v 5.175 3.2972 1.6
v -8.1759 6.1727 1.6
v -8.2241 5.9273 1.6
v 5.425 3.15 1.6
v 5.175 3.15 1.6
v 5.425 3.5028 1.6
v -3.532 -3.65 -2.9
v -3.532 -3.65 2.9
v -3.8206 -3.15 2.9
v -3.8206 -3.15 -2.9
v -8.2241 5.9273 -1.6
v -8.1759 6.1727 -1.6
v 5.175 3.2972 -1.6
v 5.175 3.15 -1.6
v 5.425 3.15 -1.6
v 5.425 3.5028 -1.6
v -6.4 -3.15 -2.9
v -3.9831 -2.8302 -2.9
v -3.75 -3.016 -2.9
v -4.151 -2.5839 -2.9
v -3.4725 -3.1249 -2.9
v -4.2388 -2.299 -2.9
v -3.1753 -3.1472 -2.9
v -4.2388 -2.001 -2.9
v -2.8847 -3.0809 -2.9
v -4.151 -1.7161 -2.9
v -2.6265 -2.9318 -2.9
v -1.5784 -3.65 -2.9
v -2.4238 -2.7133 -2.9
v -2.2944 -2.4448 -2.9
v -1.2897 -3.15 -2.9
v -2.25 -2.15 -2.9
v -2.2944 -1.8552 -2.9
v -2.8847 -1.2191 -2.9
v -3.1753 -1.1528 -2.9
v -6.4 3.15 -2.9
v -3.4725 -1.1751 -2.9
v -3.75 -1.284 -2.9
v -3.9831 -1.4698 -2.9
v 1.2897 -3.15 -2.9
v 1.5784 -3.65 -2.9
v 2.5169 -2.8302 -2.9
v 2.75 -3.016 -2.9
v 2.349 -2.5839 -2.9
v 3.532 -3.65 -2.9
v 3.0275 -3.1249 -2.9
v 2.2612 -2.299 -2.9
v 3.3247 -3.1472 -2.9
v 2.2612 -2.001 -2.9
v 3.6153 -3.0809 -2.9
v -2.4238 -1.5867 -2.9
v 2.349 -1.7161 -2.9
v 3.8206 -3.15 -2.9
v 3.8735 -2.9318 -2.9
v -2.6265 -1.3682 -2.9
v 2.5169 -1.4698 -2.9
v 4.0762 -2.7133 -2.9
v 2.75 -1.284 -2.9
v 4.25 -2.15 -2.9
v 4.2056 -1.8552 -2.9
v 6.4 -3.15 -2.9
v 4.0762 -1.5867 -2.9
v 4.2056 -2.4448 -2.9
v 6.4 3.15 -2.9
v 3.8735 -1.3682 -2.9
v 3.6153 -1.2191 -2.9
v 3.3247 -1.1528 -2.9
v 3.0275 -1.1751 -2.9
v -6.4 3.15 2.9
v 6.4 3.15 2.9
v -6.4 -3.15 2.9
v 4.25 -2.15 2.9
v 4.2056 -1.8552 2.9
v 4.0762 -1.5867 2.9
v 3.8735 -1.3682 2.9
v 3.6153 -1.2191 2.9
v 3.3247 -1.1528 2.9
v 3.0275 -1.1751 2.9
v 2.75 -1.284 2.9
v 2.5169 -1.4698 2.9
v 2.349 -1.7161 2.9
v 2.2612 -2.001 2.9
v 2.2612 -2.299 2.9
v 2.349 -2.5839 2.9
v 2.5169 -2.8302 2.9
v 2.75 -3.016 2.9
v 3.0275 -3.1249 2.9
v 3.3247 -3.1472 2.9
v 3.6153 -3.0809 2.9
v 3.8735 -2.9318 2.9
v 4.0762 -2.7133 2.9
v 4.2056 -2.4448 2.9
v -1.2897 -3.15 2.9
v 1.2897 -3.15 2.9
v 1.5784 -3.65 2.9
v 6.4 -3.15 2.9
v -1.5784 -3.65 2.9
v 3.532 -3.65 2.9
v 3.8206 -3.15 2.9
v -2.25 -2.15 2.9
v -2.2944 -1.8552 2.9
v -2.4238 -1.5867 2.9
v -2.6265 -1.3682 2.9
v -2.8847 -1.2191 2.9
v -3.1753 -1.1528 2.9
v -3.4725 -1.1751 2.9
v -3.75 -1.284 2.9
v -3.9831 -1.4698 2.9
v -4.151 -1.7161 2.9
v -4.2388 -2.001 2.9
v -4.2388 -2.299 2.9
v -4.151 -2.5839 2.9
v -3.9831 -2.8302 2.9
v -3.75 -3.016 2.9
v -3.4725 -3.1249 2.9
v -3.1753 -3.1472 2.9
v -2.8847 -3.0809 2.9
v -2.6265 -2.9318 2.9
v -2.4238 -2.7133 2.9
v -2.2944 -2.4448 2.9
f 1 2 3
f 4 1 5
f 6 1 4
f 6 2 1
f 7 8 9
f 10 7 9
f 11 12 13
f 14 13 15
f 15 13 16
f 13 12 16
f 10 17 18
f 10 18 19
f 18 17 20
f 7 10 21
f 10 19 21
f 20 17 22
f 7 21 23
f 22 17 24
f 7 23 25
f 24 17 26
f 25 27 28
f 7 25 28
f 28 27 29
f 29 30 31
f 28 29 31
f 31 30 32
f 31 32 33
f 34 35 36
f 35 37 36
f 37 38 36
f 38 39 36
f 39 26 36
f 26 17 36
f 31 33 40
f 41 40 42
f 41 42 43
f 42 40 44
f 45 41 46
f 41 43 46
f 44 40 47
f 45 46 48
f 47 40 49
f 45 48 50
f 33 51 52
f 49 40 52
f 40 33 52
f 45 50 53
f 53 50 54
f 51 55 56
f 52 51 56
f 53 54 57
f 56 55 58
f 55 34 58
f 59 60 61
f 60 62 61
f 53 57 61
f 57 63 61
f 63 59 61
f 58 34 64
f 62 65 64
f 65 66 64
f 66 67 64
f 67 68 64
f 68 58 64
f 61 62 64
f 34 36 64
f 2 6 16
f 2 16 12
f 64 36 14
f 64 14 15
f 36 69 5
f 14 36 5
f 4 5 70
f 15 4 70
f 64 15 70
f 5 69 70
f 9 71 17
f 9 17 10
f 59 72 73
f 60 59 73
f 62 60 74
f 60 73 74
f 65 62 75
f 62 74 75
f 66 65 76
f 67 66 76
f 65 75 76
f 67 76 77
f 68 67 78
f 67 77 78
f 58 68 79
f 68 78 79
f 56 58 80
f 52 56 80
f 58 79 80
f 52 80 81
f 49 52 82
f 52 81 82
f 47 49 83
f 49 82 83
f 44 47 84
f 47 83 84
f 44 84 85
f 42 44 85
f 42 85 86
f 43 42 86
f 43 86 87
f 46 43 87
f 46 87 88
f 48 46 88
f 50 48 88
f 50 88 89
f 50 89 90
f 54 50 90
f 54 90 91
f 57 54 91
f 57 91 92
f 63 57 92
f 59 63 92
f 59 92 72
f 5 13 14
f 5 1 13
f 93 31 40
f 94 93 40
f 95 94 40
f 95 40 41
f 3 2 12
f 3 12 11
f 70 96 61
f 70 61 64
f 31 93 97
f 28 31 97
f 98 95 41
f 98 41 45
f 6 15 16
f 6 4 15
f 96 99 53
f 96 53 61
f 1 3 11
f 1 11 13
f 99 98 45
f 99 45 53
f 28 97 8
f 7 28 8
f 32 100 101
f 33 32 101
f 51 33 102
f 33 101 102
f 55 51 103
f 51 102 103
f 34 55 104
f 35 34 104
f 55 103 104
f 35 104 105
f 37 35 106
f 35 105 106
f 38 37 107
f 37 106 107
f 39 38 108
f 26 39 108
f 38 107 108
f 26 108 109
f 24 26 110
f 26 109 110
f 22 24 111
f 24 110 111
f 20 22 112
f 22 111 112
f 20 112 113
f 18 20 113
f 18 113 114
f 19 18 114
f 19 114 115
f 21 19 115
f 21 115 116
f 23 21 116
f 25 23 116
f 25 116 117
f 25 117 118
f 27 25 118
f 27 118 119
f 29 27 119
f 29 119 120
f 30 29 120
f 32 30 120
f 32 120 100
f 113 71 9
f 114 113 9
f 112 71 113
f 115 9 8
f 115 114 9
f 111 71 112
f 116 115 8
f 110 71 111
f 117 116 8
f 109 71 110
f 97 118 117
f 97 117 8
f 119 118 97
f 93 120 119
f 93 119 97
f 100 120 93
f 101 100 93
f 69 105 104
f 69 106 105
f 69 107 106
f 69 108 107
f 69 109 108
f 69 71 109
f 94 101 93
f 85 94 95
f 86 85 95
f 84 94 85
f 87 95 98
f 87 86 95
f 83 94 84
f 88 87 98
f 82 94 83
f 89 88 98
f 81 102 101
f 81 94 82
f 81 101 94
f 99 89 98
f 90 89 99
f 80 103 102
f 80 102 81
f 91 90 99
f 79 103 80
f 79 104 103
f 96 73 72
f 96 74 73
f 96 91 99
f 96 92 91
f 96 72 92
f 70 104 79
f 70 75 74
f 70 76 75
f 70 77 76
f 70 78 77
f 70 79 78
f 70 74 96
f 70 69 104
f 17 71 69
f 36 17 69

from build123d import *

# Parameters (mm, degrees)
SKETCH1_W           = 12.8
SKETCH1_H           = 6.3
BOSS_EXTRUDE1_DEPTH = 2.9
BOSS_EXTRUDE3_DEPTH = 5.8
SKETCH2_3_R         = 1
CUT_EXTRUDE2_DEPTH  = 10.376699846
EXTRUDE_THIN1_DEPTH = 1.6


with BuildPart() as part:
    # Sketch1 → Boss-Extrude1 (new, symmetric)
    with BuildSketch(Plane.XY):
        Rectangle(SKETCH1_W, SKETCH1_H)
    extrude(amount=BOSS_EXTRUDE1_DEPTH, both=True)

    # Sketch2 → Boss-Extrude3 (add, through all)
    with BuildSketch(Plane.XY.offset(2.9)):
        Polygon((-4.508746523, -1.958141571), (-3.531951604, -0.266283143), (-1.578361765, -0.266283143), (-0.601566846, -1.958141571), (-1.578361765, -3.65), (-3.531951604, -3.65), align=None)
        Polygon((3.531951604, -0.266283143), (1.578361765, -0.266283143), (0.601566846, -1.958141571), (1.578361765, -3.65), (3.531951604, -3.65), (4.508746523, -1.958141571), align=None)
    extrude(amount=-BOSS_EXTRUDE3_DEPTH)

    # Sketch2<3> → Cut-Extrude2 (cut, through all)
    with BuildSketch(Plane.XY.offset(2.9)):
        with Locations((3.25, -2.15)):
            Circle(SKETCH2_3_R)
        with Locations((-3.25, -2.15)):
            Circle(SKETCH2_3_R)
    extrude(amount=-CUT_EXTRUDE2_DEPTH, mode=Mode.SUBTRACT)

    # Sketch3 → Extrude-Thin1 (add, symmetric)
    with BuildSketch(Plane.XY):
        Polygon((5.425, 3.15), (5.425, 3.502848465), (-8.175922459, 6.17265917), (-8.224077541, 5.92734083), (5.175, 3.297151535), (5.175, 3.15), align=None)
    extrude(amount=EXTRUDE_THIN1_DEPTH, both=True)


solid = part.part
